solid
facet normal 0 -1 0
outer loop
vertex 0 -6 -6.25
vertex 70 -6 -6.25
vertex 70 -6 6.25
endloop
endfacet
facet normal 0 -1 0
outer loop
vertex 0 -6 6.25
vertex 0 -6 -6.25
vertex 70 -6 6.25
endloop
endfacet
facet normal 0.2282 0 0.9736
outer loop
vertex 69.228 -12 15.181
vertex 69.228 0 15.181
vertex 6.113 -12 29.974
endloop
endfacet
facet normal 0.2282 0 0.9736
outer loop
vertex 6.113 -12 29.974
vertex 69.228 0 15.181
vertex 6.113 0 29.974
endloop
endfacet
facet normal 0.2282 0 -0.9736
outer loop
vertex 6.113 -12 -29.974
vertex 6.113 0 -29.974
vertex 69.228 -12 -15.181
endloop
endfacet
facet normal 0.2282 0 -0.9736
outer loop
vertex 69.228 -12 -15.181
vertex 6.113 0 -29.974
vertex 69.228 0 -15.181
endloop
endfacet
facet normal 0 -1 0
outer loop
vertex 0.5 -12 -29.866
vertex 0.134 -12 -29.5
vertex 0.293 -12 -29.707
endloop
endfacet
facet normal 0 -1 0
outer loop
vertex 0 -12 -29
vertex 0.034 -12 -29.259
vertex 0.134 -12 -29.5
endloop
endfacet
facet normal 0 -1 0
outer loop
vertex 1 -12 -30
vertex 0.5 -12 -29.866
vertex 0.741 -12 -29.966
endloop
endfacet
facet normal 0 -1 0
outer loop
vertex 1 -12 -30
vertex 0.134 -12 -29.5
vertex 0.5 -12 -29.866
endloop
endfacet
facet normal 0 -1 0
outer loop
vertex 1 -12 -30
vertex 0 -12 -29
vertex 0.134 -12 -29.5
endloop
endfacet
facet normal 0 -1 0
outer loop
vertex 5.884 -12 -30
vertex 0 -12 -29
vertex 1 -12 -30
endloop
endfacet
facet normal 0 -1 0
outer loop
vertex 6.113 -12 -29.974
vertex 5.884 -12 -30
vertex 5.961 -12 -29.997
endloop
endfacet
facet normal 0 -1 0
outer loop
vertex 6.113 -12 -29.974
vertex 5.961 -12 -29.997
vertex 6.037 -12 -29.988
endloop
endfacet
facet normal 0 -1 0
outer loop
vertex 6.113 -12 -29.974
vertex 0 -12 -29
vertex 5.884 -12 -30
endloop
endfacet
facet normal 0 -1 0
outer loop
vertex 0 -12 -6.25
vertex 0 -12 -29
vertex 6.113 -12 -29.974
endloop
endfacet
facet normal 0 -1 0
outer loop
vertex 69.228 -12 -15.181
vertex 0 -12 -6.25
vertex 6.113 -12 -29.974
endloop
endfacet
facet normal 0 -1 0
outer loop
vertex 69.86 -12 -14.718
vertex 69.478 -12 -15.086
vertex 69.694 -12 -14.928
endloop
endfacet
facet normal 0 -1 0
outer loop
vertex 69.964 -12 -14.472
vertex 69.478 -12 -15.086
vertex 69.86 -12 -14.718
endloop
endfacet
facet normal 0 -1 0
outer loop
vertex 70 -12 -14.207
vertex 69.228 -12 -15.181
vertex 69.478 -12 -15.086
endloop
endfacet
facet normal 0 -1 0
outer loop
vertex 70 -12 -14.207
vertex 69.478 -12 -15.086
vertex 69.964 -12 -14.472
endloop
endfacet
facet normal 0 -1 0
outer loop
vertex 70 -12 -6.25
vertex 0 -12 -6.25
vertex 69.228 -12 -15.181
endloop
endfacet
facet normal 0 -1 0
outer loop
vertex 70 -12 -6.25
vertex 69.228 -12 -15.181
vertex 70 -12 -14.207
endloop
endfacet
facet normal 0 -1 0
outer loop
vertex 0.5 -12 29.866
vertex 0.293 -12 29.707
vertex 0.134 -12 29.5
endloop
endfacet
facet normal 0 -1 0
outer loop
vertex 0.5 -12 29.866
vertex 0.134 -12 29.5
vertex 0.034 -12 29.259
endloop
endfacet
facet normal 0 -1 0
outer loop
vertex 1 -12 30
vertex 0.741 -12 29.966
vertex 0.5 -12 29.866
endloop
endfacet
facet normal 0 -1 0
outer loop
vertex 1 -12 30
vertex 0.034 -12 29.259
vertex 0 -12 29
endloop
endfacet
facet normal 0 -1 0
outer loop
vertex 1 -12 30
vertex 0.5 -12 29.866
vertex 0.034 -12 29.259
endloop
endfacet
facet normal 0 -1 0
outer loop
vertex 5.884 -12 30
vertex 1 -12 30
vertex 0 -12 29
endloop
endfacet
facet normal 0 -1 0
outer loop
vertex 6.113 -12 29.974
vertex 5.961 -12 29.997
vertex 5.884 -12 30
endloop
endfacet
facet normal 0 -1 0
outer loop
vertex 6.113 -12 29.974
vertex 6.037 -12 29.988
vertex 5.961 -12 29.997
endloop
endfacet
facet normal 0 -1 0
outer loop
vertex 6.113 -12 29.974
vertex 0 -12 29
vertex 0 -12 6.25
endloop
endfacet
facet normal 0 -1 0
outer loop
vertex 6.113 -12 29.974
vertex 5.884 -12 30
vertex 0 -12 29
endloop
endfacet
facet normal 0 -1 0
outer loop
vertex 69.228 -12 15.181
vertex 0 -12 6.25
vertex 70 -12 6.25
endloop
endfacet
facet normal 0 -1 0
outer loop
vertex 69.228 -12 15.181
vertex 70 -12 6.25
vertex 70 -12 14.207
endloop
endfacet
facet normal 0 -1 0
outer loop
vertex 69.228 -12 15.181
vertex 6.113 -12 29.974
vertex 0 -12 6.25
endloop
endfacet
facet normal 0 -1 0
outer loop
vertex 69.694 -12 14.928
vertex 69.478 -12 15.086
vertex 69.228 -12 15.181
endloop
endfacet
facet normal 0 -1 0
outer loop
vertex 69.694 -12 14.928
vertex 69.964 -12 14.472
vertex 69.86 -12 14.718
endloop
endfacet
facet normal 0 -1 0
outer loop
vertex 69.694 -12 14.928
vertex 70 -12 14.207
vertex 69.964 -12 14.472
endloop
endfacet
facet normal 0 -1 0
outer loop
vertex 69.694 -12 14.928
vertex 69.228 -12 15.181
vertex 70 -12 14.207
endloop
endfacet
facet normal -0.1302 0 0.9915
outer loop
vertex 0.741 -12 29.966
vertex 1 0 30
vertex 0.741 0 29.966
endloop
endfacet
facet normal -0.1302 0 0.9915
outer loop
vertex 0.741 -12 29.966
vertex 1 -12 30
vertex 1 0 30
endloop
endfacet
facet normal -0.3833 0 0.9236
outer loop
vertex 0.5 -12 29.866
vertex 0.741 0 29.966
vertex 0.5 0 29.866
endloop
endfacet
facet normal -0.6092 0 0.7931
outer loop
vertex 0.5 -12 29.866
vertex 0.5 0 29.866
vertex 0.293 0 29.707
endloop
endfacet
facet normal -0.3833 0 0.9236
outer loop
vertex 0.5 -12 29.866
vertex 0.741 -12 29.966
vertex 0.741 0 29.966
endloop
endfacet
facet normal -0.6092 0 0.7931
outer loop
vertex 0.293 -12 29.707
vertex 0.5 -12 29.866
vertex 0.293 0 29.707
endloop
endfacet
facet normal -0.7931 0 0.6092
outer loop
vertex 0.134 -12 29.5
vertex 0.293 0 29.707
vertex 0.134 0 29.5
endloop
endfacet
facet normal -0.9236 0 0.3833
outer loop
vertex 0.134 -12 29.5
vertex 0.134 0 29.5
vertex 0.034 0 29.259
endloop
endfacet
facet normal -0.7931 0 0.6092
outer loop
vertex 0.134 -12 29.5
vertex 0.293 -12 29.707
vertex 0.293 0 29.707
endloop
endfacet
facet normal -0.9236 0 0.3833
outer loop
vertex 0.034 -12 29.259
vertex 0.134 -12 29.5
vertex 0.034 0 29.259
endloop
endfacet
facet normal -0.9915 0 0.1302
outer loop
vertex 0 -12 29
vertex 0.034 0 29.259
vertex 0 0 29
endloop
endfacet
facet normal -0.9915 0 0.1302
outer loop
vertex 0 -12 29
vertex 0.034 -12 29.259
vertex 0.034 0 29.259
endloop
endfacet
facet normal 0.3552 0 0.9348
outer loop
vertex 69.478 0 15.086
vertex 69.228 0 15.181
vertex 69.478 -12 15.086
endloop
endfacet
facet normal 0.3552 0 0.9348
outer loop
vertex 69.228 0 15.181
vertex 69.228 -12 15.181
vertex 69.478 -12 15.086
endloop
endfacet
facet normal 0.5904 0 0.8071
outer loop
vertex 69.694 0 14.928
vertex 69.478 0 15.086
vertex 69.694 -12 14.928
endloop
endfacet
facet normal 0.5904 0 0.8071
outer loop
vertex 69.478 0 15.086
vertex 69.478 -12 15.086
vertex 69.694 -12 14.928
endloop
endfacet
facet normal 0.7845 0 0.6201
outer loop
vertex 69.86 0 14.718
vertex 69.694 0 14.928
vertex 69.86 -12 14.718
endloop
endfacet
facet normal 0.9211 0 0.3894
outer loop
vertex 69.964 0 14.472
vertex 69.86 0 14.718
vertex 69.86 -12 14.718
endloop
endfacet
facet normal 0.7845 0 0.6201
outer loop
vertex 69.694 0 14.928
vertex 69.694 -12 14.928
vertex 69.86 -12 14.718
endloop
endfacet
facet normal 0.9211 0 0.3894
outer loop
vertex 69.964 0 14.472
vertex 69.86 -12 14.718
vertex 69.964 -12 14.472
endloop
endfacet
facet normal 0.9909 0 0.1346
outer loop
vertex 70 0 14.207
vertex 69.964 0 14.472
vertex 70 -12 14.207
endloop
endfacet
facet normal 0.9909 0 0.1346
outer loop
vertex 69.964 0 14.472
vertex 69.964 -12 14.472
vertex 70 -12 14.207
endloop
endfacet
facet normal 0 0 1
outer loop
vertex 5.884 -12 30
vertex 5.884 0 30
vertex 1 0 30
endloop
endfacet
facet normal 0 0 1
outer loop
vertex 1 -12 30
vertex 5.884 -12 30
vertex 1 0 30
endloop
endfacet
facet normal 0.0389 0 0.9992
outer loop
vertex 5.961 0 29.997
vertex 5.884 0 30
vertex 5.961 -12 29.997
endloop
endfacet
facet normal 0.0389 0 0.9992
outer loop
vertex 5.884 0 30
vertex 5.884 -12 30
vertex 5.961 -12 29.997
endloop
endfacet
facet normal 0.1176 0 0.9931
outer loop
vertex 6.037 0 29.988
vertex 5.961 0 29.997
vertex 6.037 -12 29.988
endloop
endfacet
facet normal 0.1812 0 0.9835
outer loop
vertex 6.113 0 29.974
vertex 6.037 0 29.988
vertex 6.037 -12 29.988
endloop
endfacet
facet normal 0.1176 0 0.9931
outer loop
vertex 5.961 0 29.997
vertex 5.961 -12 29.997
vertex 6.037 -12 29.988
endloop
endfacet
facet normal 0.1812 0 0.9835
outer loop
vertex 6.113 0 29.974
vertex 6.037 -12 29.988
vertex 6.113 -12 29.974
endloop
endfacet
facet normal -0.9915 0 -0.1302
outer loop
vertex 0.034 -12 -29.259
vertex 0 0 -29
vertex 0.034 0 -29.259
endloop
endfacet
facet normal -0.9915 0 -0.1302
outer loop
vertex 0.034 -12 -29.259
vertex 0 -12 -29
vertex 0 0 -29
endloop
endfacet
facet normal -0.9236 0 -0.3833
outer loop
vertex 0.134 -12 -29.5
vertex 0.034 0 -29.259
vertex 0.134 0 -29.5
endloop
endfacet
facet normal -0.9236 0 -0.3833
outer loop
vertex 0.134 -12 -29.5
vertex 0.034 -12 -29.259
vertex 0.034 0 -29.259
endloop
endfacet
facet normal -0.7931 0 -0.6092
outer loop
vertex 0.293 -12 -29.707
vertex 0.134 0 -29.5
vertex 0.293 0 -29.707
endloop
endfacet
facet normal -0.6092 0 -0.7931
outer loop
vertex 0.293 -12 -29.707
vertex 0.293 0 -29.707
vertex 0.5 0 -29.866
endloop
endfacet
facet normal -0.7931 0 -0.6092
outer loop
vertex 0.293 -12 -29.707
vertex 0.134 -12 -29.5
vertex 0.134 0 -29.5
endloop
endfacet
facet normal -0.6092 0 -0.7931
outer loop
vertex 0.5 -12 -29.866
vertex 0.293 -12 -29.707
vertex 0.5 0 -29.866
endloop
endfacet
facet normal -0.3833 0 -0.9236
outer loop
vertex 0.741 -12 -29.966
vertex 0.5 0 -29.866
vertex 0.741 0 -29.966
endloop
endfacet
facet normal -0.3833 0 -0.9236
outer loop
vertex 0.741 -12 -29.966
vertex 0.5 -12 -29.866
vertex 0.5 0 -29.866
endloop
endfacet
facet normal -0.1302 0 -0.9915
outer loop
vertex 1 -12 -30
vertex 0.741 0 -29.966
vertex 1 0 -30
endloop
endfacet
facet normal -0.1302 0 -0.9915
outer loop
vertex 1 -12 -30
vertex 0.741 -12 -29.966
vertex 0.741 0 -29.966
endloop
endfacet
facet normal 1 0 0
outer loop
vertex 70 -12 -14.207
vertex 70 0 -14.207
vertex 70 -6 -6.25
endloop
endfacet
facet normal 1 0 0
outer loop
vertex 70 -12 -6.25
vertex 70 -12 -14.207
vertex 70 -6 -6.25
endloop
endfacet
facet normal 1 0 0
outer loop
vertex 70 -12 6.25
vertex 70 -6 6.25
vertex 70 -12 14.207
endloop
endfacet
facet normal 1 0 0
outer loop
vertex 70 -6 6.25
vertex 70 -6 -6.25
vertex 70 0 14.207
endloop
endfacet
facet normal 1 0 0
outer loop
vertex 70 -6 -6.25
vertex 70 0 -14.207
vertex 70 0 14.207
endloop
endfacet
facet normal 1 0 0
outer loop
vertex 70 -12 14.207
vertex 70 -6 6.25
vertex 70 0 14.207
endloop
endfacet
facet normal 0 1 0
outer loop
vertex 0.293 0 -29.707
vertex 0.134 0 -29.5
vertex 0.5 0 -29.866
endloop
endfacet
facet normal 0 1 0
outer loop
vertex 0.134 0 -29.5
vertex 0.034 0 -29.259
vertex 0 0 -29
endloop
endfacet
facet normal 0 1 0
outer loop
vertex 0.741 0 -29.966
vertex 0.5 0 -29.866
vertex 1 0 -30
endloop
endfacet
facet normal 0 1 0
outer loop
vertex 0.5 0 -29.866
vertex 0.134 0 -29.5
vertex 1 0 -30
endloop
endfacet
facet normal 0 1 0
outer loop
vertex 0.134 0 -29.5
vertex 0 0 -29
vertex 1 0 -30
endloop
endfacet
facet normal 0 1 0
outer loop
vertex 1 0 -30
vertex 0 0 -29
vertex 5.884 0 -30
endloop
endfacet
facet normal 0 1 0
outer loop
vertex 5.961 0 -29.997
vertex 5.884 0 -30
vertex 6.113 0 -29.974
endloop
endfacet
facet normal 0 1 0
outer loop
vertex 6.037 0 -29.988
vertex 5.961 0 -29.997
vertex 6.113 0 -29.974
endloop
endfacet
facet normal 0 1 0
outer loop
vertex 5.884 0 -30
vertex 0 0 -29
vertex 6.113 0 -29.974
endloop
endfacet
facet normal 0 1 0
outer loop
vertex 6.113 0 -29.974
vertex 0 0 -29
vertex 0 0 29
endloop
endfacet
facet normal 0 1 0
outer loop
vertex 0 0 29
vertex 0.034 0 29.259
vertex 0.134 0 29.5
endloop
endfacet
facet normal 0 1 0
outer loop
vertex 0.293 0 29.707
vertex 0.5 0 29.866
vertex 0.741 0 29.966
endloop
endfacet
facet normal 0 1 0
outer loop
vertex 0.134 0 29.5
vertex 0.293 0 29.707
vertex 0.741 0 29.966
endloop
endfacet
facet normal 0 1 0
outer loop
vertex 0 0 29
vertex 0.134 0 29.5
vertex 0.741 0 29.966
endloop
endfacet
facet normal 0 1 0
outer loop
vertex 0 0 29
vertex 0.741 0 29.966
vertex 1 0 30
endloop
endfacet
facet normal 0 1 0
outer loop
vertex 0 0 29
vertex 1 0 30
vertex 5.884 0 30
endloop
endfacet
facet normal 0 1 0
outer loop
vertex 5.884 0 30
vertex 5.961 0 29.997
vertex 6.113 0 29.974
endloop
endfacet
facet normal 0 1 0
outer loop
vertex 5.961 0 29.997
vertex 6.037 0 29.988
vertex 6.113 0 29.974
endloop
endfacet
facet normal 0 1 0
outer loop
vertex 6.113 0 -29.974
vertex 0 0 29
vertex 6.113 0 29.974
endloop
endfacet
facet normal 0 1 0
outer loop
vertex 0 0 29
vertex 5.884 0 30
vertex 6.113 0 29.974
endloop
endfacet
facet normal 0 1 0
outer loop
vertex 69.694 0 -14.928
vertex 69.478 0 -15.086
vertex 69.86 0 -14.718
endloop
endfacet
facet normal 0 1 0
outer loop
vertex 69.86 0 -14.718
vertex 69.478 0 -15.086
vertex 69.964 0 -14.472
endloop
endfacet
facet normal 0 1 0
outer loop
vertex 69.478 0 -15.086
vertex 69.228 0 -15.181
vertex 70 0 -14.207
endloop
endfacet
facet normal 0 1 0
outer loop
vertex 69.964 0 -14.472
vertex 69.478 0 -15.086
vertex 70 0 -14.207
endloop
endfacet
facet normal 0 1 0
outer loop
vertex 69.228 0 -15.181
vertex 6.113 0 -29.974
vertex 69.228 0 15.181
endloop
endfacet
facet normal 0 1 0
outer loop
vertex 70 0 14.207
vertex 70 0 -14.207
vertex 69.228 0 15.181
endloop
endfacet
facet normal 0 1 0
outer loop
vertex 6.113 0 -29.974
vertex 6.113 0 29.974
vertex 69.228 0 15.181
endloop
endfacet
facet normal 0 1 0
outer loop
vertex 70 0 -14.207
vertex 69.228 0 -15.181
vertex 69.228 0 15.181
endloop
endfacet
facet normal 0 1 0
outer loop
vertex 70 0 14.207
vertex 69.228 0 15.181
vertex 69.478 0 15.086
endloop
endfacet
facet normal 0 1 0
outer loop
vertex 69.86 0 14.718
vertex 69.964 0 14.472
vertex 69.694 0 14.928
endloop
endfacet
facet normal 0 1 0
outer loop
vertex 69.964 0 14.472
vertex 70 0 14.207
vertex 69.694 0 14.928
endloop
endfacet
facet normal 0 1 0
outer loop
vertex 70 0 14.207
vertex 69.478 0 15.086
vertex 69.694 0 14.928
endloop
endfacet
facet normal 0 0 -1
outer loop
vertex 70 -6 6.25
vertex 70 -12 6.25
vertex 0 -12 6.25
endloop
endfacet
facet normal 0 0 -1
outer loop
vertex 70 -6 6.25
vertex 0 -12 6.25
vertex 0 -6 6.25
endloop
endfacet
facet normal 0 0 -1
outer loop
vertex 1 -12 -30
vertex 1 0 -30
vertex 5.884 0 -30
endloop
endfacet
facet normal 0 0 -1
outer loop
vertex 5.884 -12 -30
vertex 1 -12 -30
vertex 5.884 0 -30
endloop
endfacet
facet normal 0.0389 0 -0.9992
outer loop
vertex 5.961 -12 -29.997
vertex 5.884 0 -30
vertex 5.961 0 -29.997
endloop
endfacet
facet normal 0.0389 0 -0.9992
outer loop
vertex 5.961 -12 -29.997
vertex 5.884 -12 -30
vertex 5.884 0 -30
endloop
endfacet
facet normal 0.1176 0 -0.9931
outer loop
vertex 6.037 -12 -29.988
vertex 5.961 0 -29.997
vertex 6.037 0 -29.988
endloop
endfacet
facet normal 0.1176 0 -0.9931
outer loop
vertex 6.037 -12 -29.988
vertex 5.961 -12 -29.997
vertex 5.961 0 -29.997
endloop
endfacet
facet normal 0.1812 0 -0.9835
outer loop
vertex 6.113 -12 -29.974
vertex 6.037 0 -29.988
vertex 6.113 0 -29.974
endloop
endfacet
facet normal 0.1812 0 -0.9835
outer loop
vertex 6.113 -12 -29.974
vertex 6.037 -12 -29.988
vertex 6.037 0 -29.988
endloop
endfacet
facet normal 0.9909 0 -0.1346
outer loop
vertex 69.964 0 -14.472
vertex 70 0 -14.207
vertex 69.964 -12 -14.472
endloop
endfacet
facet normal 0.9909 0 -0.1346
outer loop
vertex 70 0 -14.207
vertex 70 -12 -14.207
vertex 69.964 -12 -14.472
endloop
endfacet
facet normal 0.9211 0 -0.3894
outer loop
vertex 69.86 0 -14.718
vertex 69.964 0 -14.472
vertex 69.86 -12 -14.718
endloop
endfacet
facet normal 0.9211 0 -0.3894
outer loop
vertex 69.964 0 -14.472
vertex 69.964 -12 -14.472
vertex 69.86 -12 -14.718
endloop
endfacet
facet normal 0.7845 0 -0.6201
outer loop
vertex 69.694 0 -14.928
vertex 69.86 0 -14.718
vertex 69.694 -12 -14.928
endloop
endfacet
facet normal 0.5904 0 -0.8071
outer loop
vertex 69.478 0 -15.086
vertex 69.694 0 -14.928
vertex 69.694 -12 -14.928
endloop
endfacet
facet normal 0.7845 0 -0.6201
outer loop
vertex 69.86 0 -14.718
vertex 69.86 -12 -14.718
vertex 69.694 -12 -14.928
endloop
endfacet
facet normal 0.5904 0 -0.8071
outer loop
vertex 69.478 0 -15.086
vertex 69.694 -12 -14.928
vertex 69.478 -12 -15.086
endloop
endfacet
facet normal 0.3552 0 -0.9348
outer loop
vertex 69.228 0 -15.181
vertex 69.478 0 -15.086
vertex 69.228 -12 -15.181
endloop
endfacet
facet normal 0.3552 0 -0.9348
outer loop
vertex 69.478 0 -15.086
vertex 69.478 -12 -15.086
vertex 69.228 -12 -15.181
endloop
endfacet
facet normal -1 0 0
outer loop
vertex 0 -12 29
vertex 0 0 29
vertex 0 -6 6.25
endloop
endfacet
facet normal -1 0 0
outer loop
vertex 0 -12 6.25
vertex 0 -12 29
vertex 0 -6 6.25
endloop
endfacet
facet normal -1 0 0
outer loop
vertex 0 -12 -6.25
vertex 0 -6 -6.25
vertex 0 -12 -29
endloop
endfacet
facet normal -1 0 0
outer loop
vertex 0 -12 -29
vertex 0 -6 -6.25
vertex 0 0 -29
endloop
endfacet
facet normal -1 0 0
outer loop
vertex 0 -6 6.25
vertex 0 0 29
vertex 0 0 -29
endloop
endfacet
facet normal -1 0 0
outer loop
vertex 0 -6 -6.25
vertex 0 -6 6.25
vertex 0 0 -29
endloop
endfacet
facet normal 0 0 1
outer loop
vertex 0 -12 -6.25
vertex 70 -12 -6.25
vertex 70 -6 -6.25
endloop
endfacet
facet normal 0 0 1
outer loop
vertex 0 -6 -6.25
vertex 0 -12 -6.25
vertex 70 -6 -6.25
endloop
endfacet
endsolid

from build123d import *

# Parameters (mm, degrees)
F1_DEPTH = 12
F2_W     = 6
F2_H     = 12.5
F3_DEPTH = 70.001
F4_R     = 1


with BuildPart() as f1:
    # F0 (on Front) → F1 (new body)
    with BuildSketch(Plane.XZ):
        Polygon((6, 30), (0, 30), (0, -30), (6, -30), (70, -15), (70, 15), align=None)
    extrude(amount=F1_DEPTH)

    # F2 (on face) → F3 (cut, through all)
    with BuildSketch(Plane.YZ.offset(70)):
        with Locations((-9, 0)):
            Rectangle(F2_W, F2_H)
    extrude(amount=-F3_DEPTH, mode=Mode.SUBTRACT)

    # F4
    f4_edges = [f1.edges().sort_by_distance(p)[0] for p in [
        (70, -6, 15),
        (6, -6, 30),
        (0, -6, 30),
        (70, -6, -15),
        (6, -6, -30),
        (0, -6, -30),
    ]]
    fillet(f4_edges, radius=F4_R)


solid = f1.part
